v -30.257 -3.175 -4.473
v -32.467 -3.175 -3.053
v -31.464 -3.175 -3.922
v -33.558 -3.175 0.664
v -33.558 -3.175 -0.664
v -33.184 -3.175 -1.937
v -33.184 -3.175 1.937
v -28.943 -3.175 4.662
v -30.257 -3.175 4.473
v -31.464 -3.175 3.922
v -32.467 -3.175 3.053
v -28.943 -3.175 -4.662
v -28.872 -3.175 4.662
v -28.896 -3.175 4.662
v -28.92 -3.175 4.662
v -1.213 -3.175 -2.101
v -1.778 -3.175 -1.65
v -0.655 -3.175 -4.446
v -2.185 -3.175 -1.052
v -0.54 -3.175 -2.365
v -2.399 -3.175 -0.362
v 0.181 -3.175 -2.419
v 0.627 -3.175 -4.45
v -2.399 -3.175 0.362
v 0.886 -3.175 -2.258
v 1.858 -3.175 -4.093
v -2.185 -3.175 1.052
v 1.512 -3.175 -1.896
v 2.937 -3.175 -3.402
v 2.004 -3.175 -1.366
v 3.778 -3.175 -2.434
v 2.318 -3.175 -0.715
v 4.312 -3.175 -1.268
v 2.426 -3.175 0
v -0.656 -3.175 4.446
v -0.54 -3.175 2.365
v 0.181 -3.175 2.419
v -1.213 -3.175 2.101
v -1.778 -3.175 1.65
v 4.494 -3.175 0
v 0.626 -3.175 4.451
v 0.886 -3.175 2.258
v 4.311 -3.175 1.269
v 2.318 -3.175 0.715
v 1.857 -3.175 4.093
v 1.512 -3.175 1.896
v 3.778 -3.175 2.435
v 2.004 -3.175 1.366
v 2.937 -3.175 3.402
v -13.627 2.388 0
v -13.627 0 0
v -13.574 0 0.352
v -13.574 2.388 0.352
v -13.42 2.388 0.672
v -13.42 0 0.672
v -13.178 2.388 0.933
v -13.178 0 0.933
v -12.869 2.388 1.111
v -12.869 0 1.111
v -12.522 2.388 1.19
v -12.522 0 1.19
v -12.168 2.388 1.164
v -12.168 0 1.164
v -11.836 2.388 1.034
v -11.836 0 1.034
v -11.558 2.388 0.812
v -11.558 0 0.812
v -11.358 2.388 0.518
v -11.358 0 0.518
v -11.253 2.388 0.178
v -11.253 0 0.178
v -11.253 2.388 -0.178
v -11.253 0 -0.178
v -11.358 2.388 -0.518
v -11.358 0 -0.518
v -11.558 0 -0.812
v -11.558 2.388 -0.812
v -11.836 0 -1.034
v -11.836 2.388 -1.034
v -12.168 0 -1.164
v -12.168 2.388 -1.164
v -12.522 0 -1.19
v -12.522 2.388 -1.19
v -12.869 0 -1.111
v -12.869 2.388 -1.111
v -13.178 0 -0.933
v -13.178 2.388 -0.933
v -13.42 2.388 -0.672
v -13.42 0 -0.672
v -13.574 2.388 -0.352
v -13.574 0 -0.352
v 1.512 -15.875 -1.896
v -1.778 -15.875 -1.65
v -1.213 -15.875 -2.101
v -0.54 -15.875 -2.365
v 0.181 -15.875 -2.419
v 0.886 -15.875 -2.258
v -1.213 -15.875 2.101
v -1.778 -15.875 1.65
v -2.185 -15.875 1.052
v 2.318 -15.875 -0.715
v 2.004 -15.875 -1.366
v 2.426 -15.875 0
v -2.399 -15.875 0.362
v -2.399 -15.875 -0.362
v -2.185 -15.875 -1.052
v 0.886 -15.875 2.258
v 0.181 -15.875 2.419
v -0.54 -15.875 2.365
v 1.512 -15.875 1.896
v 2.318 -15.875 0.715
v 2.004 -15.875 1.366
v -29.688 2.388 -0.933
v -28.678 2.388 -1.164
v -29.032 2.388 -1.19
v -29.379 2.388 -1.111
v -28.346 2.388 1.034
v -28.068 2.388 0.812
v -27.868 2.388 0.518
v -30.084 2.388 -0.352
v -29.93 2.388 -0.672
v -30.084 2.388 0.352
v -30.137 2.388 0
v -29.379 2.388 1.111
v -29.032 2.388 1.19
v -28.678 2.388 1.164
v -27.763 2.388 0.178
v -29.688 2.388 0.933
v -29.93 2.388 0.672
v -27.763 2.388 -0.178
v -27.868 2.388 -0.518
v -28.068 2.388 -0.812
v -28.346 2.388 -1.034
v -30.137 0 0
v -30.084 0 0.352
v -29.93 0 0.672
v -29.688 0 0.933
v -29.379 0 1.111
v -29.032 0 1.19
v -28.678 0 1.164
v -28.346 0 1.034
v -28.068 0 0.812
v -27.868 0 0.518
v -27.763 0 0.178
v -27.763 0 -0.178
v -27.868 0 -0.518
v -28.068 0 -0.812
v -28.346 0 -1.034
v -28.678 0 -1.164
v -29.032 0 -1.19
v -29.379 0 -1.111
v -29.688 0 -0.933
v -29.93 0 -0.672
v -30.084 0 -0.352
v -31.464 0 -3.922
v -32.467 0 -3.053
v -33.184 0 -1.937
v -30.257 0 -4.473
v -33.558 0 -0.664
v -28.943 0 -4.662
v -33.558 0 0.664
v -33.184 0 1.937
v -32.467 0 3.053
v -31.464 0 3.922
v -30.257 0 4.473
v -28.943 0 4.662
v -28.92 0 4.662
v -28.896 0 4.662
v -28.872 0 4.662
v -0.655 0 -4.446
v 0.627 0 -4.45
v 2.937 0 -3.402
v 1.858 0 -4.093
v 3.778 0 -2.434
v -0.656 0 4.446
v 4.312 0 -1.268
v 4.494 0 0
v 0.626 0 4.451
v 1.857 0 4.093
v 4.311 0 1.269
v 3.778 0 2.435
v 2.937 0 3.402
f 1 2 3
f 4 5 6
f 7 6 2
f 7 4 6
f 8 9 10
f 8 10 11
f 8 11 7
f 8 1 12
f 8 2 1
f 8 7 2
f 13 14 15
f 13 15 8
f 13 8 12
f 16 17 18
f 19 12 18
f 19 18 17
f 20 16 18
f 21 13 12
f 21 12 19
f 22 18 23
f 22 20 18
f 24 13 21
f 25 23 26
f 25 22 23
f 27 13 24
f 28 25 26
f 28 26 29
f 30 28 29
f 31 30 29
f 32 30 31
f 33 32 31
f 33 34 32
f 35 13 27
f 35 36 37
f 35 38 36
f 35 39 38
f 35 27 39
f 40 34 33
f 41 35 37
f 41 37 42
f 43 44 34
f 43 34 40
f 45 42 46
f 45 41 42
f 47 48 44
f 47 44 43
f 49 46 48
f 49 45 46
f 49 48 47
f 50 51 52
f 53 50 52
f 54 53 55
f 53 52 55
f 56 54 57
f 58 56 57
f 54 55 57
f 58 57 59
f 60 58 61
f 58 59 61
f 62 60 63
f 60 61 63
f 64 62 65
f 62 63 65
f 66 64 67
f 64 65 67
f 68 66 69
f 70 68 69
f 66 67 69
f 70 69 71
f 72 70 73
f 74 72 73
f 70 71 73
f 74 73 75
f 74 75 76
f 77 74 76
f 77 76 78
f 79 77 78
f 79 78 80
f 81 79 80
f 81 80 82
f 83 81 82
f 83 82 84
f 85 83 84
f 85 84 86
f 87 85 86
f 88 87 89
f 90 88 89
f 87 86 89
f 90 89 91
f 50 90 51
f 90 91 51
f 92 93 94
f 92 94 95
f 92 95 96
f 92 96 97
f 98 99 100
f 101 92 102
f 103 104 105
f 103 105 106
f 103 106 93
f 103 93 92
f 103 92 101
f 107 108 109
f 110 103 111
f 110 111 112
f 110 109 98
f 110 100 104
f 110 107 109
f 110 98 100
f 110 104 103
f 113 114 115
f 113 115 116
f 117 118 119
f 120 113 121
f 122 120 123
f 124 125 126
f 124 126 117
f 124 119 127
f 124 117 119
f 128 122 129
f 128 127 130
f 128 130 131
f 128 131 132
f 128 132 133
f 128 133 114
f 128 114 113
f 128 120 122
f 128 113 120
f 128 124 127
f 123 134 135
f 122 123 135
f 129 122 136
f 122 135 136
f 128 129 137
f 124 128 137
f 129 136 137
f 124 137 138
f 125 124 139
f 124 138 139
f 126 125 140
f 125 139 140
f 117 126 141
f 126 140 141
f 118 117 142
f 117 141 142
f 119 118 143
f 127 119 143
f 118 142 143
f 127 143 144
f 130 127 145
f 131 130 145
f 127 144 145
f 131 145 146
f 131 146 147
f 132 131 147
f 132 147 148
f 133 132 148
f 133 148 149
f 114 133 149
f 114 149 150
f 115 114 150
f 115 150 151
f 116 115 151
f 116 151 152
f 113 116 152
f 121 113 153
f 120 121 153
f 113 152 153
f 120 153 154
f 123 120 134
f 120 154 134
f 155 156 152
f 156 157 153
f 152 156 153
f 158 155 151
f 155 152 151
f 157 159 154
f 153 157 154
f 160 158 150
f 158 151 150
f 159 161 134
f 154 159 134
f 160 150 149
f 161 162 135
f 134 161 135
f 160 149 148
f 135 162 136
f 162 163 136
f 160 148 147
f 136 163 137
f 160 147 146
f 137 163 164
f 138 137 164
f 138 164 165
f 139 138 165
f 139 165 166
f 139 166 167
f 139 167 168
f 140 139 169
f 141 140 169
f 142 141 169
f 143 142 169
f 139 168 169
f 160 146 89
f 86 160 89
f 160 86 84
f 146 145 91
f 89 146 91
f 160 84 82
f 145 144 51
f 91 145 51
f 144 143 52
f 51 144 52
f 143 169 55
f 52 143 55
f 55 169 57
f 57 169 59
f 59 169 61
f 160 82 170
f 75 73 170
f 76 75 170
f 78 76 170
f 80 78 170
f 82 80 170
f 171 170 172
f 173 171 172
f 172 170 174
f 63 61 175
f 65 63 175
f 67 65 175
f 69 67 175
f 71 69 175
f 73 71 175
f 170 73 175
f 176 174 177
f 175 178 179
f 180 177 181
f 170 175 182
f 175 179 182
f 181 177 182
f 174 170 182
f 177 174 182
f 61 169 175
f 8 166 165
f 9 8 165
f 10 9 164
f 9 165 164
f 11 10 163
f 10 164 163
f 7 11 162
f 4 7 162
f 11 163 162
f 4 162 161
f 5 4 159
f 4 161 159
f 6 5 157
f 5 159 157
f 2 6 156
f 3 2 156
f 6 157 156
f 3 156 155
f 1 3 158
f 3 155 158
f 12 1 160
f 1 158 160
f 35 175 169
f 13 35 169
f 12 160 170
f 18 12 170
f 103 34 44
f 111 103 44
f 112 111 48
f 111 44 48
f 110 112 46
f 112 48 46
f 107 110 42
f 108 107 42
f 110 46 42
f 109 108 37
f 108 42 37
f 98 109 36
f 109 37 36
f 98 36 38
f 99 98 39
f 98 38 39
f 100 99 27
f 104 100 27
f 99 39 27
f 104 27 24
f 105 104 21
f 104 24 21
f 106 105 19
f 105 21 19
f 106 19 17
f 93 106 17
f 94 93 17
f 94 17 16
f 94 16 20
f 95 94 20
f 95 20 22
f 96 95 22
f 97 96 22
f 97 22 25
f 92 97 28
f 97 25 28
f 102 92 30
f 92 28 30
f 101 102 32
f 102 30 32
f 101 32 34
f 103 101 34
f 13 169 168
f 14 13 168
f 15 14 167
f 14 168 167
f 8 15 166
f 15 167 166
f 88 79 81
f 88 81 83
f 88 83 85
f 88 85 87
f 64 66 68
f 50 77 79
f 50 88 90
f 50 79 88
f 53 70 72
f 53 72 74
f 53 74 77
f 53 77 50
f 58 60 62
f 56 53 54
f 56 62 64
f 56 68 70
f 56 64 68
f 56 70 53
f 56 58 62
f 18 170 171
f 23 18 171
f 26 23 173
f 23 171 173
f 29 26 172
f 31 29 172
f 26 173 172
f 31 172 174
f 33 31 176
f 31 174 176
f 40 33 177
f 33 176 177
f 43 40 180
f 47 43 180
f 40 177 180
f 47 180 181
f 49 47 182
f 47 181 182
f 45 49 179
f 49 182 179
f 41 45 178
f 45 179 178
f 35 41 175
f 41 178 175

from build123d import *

# Parameters (mm, degrees)
F1_DEPTH = 3.175
F2_R     = 2.4257
F3_DEPTH = 12.7
F4_R     = 1.1938
F5_DEPTH = 2.3876


with BuildPart() as f1:
    # F0 (on Front) → F1 (new body)
    with BuildSketch(Plane.XZ):
        with BuildLine():
            Line((-28.943281, 4.662325), (-28.87206, 4.661781))
            ThreePointArc((-28.87206, 4.661781), (-28.907669, 4.662189), (-28.943281, 4.662325))
        make_face()
        with BuildLine():
            Line((-0.656047, 4.446255), (-28.87206, 4.661781))
            Line((-28.87206, 4.661781), (-28.943281, 4.662325))
            ThreePointArc((-28.943281, 4.662325), (-33.605606, 0), (-28.943281, -4.662325))
            Line((-28.943281, -4.662325), (-0.655231, -4.446375))
            ThreePointArc((-0.655231, -4.446375), (4.494394, 0.000412), (-0.656047, 4.446255))
        make_face()
    extrude(amount=F1_DEPTH)

    # F2 (on face) → F3 (join)
    with BuildSketch(Plane.XZ.offset(3.175)):
        Circle(F2_R)
    extrude(amount=F3_DEPTH)

    # F4 (on face) → F5 (join)
    with BuildSketch(Plane(origin=(0, 0, 0), x_dir=(-1, 0, 0), z_dir=(0, 1, 0))):
        with Locations((28.943281, 0)):
            Circle(F4_R)
        with Locations((12.433281, 0)):
            Circle(F4_R)
    extrude(amount=F5_DEPTH)


solid = f1.part
